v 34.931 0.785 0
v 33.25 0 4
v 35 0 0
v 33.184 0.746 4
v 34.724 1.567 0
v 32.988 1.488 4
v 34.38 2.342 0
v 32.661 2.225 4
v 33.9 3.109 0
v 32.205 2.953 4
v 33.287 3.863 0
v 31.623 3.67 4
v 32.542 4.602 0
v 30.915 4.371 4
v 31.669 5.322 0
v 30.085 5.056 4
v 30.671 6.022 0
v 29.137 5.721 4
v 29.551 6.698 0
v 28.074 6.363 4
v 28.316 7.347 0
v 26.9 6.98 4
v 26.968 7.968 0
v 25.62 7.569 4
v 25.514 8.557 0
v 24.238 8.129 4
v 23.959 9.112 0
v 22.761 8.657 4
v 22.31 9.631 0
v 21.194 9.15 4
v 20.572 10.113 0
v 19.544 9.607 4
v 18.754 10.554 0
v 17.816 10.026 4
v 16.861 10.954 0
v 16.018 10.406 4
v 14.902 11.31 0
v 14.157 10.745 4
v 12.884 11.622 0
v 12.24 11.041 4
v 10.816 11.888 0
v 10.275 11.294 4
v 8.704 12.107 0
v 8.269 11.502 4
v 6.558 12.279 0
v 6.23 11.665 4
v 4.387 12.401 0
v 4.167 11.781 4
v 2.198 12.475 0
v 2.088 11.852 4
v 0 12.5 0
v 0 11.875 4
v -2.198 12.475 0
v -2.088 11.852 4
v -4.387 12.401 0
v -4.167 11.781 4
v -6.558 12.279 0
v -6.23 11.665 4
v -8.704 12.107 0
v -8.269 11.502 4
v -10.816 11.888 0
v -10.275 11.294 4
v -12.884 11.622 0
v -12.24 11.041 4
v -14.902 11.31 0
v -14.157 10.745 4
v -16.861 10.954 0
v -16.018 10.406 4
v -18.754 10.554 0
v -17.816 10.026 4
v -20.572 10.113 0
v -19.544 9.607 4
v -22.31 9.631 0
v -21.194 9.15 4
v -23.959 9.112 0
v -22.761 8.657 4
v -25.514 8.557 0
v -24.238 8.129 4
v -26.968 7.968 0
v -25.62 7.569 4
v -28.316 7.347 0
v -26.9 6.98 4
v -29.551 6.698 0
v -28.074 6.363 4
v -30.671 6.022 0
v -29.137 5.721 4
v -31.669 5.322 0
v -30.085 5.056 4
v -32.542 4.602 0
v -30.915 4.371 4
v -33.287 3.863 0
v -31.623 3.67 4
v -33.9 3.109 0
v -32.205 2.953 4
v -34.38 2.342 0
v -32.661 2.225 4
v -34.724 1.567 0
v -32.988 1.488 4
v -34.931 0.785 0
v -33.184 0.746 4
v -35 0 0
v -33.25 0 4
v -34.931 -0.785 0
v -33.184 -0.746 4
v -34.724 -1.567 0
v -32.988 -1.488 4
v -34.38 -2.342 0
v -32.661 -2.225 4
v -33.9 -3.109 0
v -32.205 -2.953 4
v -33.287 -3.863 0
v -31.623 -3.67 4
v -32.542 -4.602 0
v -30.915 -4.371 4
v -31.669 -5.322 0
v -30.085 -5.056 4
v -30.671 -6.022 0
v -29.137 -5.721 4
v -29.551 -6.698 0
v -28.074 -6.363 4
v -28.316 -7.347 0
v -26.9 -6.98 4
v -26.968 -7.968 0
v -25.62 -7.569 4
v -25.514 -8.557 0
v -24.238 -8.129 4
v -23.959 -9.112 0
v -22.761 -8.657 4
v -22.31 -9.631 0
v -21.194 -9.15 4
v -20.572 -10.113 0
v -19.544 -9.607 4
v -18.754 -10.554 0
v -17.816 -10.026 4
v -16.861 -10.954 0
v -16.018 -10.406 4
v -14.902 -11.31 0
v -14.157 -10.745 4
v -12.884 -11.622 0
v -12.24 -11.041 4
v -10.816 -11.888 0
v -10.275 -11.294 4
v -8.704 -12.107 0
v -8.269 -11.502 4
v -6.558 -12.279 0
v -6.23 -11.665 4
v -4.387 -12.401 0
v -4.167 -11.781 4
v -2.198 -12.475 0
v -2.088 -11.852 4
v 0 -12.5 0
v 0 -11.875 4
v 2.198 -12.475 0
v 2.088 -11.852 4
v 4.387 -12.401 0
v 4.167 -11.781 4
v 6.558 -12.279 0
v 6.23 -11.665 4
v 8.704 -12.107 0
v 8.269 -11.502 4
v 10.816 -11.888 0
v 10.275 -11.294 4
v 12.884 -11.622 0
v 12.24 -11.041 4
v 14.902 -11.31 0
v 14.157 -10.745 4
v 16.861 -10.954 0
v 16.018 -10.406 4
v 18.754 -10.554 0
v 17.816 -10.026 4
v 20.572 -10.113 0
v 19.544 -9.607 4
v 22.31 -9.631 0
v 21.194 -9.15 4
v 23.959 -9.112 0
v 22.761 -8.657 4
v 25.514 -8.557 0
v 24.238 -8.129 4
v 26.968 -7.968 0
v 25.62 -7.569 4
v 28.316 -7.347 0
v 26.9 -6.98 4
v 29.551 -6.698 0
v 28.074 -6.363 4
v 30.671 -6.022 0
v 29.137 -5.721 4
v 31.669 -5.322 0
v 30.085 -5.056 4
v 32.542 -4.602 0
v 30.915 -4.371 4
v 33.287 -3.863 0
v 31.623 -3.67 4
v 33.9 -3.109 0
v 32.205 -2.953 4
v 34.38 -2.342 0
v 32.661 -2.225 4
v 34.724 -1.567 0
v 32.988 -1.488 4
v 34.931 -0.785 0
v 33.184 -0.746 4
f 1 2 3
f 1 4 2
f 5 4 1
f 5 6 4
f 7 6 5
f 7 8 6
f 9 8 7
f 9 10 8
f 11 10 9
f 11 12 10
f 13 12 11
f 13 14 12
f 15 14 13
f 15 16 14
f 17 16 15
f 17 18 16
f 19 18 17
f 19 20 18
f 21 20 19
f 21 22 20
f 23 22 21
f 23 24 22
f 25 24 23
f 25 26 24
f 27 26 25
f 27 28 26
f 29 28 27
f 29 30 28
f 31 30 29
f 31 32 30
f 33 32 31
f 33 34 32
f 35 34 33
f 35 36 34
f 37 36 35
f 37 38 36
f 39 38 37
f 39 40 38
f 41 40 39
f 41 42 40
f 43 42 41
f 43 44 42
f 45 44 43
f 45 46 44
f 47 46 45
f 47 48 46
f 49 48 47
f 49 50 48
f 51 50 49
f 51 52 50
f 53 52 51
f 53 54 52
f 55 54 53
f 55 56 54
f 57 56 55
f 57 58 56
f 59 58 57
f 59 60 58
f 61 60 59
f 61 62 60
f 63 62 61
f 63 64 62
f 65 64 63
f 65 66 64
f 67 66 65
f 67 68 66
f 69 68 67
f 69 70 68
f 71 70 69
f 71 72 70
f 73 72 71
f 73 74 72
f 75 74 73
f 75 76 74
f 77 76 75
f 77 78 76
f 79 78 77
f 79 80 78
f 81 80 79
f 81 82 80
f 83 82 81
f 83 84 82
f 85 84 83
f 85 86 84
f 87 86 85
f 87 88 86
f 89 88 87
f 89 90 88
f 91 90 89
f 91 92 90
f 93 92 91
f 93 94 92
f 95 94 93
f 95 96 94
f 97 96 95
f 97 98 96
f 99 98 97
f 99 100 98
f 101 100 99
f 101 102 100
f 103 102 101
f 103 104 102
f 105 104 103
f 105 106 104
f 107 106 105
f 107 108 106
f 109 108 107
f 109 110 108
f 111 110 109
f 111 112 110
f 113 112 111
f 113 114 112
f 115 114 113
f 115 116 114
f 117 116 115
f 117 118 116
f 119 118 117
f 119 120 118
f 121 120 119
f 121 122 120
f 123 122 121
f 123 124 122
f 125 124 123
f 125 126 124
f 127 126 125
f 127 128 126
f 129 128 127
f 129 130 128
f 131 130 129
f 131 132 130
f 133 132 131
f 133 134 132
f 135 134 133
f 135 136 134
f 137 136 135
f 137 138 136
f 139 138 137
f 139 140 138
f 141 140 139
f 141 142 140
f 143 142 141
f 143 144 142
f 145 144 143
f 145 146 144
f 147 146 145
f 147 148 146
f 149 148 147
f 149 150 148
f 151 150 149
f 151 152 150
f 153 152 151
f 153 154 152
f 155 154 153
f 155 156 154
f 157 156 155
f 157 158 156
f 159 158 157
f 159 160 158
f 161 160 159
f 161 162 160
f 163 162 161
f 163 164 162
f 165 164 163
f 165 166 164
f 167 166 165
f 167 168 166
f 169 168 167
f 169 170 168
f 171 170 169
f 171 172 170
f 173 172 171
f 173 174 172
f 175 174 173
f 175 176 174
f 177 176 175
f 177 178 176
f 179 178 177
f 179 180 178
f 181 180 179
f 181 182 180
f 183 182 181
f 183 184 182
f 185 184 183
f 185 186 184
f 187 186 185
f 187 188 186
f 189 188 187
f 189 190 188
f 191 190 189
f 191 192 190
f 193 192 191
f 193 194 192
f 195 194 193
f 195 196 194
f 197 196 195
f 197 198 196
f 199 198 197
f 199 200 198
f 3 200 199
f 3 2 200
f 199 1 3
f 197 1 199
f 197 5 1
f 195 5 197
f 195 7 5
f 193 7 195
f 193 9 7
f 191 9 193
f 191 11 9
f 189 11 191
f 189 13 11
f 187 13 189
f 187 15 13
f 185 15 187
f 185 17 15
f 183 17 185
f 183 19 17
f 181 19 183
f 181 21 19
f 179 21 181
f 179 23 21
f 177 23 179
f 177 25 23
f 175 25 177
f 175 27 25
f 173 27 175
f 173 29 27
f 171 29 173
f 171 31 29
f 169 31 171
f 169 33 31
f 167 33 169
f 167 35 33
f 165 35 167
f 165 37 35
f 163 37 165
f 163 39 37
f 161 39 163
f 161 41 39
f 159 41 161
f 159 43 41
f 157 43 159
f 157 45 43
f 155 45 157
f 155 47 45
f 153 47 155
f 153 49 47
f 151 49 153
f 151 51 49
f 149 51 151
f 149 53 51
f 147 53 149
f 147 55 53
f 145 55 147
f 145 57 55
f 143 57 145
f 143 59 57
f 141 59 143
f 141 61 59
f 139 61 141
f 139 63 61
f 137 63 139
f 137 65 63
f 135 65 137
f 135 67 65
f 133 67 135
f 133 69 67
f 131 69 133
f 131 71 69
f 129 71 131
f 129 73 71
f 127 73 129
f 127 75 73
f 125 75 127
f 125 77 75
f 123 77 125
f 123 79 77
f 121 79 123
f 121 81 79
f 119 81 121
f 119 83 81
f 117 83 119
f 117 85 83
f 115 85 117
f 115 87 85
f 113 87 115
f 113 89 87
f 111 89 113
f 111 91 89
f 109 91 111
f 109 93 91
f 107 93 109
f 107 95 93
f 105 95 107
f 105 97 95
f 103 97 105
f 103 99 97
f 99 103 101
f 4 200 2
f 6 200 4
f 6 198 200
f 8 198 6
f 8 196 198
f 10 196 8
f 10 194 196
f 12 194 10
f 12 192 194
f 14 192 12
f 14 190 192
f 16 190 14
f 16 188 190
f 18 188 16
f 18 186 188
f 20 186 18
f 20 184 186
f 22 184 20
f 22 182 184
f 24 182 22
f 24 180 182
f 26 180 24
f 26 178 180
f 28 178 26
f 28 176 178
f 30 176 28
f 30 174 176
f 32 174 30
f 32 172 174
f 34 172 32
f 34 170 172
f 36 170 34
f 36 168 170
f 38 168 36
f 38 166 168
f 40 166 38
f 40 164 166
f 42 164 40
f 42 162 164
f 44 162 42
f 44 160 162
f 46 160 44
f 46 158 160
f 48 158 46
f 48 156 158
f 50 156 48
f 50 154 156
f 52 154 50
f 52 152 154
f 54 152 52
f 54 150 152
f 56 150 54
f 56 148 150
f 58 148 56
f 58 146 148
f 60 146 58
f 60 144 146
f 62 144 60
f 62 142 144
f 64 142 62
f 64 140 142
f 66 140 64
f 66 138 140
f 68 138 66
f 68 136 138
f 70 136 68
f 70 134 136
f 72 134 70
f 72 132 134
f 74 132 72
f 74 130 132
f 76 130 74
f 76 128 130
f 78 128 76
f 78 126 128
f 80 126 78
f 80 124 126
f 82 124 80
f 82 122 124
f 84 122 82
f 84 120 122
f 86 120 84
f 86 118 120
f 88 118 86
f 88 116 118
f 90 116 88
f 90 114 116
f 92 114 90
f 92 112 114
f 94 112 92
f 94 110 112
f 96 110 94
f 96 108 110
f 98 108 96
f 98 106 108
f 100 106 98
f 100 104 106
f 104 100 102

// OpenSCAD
// file: ../build.scad
$build_id = "";

function building(filename) = is_undef(filename) ?
  !is_undef(build)
  : !is_undef(build) && build == filename;

function previewing() = !building();

module build(filename) {
  $build_id = filename;

  if(!is_undef(scad_build_scan) && scad_build_scan == true) {
    echo(str("scad_build_scan: ", filename));
  }
  else if(previewing() || build == filename) {
    children();
  }
}

module preview_row(spacing) {
  if(previewing()) {
    for(x = [0:1:$children - 1]) {
      translate([x * spacing, 0, 0]) {
        children(x);
      }
    }
  }
  else {
    children();
  }
}

module preview_column(spacing) {
  if(previewing()) {
    for(y = [0:1:$children - 1]) {
      translate([0, y * spacing, 0]) {
        children(y);
      }
    }
  }
  else {
    children();
  }
}
// file: ../minibase.scad
// Based off of titancraft's Customizable Miniature Base (CC0 1.0)
// https://www.thingiverse.com/thing:1112237

include <./build.scad>

$base_rim = 1; //	[1: tapered, 2: inclined, 3: flat]
// Number of sides:
$base_shape = 100; //	[30:Low-res Circle, 100: Hi-res Circle, 5:Pentagon, 6:Hexagon, 8:Octagon, 4:Square, 3:Triangle]

$base_diameter = 32;
$base_height = 4;
$base_slant = 95;

// Percentage:
$base_stretch = 100;

//(tapered base only)
$base_inner_circle_ratio = 40;

module tapered(r=40) {
  $base_rim = 1;
  $base_inner_circle_ratio = r;

  children();
}

module inclined() {
  $base_rim = 2;

  children();
}

module flat() {
  $base_rim = 3;

  children();
}

module shape(s) {
  $base_shape = s;

  children();
}

module diameter(d) {
  $base_diameter = d;

  children();
}

module height(h) {
  $base_height = h;

  children();
}

module slant(s) {
  $base_slant = s;

  children();
}

module stretch(s) {
  $base_stretch = s;

  children();
}

module base(id) {
  build(id) union() {
    radius = $base_diameter/2;
    scale([$base_stretch/100, 1, 1]){
      if ($base_rim == 1){
        // tapered base
        cyl1_height = $base_height * (1-$base_inner_circle_ratio/100);
        cylinder(cyl1_height, radius, radius * $base_slant/100, $fn=$base_shape);

        cyl2_radius = radius  * $base_slant/100 * .95;
        cyl2_height = $base_height - cyl1_height;

        translate([0, 0, cyl1_height]){
          cylinder(cyl2_height, cyl2_radius, cyl2_radius * $base_slant/100, $fn=$base_shape);
          cylinder(cyl2_height*.5, radius * $base_slant/100, cyl2_radius, $fn=$base_shape);
        }
      } else if ($base_rim == 2){
        // inclined base
        cylinder($base_height, radius, radius * $base_slant/100, $fn=$base_shape);
      } else if ($base_rim == 3){
        // flat base

        cylinder($base_height, radius, radius, $fn=$base_shape);
      }
    }
  }
}
// main file
include <../minibase.scad>

inclined() diameter(25) stretch(280) base("25x70mm-oprgw-bikes");
